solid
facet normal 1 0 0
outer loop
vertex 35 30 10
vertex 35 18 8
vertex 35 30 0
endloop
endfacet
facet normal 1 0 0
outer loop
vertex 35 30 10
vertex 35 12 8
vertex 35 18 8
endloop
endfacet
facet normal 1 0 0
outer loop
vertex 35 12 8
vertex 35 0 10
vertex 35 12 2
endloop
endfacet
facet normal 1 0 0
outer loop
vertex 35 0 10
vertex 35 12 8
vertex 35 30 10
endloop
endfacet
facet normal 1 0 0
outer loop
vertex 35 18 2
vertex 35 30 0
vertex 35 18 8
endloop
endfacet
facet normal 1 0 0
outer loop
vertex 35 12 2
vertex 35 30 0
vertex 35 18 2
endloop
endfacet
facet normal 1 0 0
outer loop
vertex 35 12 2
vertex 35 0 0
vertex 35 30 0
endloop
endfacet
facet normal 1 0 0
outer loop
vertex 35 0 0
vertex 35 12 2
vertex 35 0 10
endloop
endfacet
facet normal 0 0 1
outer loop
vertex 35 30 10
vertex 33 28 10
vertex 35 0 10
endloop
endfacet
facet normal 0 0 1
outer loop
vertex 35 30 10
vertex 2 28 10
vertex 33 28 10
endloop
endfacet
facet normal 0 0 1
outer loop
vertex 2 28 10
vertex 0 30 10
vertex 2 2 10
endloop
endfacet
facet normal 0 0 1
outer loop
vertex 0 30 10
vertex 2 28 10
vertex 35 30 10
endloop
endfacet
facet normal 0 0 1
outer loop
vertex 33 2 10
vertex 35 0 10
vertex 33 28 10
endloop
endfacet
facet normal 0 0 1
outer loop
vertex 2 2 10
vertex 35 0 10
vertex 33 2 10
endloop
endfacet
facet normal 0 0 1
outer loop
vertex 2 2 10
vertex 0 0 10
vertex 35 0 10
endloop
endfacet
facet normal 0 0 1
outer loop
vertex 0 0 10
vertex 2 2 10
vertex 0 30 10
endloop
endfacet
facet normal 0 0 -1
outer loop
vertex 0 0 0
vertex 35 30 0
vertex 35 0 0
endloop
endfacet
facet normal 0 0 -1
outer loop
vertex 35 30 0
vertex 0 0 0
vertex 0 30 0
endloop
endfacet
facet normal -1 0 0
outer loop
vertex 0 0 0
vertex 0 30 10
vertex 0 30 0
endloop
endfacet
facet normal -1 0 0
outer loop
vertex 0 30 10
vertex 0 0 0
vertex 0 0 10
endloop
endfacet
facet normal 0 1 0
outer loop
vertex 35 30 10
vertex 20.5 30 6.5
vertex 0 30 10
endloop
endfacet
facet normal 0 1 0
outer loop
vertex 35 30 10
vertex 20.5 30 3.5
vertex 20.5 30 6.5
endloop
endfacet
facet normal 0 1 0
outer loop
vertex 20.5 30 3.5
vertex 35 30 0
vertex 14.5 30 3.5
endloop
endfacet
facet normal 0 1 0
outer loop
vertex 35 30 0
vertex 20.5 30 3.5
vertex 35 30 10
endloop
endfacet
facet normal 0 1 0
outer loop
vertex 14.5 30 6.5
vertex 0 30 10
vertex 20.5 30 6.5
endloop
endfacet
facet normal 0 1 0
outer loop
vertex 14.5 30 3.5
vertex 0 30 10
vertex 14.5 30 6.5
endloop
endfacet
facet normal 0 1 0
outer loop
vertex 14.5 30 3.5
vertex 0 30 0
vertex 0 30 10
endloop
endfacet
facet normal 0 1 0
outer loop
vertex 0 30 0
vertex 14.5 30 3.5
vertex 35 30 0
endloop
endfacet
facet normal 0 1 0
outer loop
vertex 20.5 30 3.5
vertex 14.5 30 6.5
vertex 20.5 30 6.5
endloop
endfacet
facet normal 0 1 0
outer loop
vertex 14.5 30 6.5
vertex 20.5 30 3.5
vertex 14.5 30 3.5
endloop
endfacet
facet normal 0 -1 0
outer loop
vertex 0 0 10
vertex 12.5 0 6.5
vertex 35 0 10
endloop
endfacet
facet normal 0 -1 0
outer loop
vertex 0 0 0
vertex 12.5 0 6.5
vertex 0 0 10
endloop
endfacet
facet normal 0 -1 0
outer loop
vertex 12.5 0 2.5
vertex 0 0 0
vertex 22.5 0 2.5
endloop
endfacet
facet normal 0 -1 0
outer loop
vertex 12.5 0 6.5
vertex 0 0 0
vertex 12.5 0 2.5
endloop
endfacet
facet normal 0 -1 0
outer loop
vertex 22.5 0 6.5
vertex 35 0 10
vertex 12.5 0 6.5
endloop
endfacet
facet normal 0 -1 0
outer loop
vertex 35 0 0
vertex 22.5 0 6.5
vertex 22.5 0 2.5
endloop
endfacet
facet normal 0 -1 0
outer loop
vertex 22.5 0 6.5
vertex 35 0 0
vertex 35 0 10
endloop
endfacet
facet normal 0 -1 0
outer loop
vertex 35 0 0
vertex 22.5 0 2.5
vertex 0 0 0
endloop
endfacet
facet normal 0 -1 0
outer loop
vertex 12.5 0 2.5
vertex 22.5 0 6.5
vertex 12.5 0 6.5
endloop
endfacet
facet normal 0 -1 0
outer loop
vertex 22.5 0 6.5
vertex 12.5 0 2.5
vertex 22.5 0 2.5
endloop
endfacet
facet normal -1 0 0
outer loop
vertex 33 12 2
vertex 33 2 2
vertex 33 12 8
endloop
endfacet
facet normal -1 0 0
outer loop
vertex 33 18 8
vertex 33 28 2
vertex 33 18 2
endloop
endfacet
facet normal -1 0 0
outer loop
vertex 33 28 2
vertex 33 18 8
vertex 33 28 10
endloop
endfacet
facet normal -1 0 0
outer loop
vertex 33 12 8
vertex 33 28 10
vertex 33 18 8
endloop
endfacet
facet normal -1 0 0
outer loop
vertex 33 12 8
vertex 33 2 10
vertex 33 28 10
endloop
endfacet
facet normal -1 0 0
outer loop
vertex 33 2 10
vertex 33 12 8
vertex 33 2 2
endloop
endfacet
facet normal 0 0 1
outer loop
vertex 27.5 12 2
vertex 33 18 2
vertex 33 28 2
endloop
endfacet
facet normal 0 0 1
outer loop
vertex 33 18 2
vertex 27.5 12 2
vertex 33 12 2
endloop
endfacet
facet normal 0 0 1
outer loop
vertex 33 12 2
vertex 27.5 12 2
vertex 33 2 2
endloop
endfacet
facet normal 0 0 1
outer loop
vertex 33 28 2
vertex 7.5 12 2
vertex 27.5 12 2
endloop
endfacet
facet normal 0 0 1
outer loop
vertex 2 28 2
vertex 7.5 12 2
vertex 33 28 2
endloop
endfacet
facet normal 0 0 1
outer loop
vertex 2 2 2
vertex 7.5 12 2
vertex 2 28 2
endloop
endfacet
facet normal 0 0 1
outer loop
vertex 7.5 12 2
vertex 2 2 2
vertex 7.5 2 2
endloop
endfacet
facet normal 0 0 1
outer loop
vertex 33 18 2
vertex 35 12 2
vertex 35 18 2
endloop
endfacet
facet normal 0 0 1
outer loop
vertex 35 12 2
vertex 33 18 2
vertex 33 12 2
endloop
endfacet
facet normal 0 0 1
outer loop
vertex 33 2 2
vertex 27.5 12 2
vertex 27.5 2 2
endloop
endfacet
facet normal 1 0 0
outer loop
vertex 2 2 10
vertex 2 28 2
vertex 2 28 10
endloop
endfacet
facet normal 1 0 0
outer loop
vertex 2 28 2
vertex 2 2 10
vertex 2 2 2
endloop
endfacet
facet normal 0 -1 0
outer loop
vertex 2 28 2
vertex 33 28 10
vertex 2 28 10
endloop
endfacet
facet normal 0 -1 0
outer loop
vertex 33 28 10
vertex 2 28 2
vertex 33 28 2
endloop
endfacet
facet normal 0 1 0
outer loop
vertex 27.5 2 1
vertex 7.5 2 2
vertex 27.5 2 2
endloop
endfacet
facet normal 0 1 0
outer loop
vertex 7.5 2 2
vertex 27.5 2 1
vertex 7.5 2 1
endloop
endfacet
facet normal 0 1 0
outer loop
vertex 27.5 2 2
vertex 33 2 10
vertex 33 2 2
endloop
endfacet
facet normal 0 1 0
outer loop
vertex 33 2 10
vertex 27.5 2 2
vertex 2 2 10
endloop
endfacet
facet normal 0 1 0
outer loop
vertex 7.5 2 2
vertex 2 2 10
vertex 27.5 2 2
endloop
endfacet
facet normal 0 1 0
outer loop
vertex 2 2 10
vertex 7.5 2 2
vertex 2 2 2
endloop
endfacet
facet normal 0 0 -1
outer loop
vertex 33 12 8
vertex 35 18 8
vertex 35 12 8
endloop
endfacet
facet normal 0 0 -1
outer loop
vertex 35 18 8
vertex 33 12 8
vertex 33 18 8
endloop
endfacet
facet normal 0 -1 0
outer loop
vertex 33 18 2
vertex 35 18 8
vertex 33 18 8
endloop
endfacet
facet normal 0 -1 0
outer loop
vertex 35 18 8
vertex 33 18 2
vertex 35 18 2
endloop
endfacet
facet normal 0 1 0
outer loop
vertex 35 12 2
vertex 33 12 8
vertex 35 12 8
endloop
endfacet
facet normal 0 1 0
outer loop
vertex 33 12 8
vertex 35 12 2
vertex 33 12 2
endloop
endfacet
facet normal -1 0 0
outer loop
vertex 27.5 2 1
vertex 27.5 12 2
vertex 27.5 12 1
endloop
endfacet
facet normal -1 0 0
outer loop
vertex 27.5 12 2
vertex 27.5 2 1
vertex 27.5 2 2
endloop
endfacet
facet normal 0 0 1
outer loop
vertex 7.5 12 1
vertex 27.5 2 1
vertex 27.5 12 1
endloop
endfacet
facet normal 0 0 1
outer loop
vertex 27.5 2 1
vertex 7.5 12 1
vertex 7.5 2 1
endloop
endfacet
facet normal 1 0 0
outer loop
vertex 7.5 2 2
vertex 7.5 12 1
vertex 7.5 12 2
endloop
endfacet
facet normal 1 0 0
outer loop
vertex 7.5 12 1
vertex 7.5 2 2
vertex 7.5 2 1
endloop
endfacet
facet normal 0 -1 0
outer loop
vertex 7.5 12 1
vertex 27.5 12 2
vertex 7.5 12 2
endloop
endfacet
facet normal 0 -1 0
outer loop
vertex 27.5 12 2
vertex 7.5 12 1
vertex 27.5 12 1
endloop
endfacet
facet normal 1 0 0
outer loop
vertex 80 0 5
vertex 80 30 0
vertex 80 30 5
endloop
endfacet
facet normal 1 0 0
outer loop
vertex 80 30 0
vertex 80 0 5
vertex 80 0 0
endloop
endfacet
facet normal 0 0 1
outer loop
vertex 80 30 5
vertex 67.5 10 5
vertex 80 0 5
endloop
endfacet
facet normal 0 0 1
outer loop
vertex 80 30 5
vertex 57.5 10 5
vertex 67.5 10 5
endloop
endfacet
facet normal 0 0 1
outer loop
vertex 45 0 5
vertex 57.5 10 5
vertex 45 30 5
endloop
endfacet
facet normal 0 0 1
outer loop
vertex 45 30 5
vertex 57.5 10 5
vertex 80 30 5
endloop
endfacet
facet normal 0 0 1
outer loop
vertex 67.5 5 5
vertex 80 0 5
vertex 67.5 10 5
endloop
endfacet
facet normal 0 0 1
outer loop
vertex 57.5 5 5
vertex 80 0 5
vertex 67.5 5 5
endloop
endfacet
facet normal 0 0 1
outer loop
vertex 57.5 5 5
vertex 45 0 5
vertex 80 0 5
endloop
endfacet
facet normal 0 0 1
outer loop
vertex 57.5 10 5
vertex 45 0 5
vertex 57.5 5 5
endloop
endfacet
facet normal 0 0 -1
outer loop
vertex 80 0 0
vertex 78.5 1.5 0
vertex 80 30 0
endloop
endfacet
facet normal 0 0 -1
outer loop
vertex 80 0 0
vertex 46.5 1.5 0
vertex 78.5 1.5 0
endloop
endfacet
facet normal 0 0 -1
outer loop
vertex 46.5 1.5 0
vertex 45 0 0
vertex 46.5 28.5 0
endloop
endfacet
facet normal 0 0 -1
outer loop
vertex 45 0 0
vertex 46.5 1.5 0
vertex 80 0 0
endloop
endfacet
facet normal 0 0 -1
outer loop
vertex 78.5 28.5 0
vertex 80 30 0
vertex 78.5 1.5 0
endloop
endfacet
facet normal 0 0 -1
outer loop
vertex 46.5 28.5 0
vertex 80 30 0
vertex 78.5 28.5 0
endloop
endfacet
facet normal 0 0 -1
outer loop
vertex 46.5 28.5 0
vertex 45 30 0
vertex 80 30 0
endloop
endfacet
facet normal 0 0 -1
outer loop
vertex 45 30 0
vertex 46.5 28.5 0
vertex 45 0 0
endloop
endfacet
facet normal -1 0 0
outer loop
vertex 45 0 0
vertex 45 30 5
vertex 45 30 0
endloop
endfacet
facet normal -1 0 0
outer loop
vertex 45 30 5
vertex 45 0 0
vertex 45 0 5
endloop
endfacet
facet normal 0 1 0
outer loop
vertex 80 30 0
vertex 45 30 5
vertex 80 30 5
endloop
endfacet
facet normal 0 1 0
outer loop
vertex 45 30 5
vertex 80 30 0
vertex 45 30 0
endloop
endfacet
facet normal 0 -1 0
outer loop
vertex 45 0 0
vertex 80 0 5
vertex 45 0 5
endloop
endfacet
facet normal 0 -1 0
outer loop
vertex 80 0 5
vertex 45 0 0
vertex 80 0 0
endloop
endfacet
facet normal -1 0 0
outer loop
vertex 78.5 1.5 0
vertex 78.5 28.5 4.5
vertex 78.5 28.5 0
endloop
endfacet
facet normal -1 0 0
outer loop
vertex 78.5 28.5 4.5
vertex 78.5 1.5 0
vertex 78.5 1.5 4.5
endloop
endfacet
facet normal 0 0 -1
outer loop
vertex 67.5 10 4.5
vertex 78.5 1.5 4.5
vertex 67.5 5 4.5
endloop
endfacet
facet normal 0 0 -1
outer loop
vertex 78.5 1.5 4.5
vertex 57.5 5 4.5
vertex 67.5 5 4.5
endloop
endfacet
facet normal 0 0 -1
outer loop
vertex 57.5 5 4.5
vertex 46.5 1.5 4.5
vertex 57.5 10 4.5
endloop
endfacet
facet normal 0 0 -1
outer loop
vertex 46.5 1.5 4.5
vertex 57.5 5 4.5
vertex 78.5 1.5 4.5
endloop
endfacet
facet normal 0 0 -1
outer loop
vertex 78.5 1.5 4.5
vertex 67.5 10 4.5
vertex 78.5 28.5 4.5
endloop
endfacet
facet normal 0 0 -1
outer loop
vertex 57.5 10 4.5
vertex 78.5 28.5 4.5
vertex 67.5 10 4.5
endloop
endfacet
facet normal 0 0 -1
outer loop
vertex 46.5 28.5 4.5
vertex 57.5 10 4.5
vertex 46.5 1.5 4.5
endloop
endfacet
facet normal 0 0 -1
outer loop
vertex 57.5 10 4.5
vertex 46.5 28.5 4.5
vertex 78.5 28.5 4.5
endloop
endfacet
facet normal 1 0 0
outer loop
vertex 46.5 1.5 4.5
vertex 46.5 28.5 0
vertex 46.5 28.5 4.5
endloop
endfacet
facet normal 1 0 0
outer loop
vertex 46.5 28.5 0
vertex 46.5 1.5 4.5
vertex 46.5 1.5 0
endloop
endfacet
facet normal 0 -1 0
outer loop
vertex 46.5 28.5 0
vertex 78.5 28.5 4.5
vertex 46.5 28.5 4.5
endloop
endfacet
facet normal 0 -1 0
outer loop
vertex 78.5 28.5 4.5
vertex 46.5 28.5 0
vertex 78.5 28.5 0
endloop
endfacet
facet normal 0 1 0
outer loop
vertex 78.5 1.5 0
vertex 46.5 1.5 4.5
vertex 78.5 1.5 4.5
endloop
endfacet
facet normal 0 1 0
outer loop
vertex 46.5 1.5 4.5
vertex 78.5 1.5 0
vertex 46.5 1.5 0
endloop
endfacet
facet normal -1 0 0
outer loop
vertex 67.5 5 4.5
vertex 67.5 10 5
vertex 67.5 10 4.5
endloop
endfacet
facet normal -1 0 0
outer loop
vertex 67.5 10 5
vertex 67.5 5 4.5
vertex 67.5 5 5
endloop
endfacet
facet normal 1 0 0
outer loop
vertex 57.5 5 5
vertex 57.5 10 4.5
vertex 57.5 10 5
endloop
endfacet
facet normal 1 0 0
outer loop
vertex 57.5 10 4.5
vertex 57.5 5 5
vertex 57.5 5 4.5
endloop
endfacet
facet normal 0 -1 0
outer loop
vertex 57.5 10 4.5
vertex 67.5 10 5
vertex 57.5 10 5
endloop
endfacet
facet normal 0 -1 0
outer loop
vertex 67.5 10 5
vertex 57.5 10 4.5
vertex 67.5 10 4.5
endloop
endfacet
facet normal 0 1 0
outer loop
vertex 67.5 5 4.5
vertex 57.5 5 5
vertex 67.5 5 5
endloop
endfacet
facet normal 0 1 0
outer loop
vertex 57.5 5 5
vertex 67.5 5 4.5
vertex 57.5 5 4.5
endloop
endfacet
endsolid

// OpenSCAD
// Two-Part Enclosure for Mini Theremin (Final Version)
// All dimensions are in millimeters

// Parameters:
enclosure_length = 35;
enclosure_width  = 30;
bottom_height    = 10;
lid_thickness    = 5;
wall_thickness   = 2;
clearance        = 0.5;

// Battery cavity (indentation only; do not cut through the bottom)
battery_cavity_length = 20;
battery_cavity_width  = 10;
battery_cavity_depth  = 5;

// USB slot parameters (back wall)
usb_cutout_width  = 10;
usb_cutout_height = 4;

// Buzzer slot parameters (front wall)
buzzer_cutout_width  = 6;
buzzer_cutout_height = 3;

// Power switch slot parameters (right wall)
switch_slot_height = 6;  // vertical extent (a square of wall thickness by 6 mm by 6 mm)

// Sensor slot parameters (in the lid)
sensor_slot_length = 10;
sensor_slot_width  = 5;

////////////////////////////
// Module: Bottom Enclosure
////////////////////////////
module bottom_enclosure() {
  difference() {
    // Outer solid box for the bottom enclosure:
    cube([enclosure_length, enclosure_width, bottom_height], false);
    
    // Hollow out the interior starting at z = wall_thickness to keep a solid bottom:
    translate([wall_thickness, wall_thickness, wall_thickness])
      cube([enclosure_length - 2*wall_thickness, enclosure_width - 2*wall_thickness, bottom_height - wall_thickness], false);
    
    // USB slot on the back wall (assumed at y = 0):
    // Cut a through–hole only through the wall thickness.
    translate([ (enclosure_length - usb_cutout_width) / 2, 0 - wall_thickness, bottom_height/4 ])
      cube([usb_cutout_width, wall_thickness, usb_cutout_height], false);
    
    // Buzzer slot on the front wall (assumed at y = enclosure_width):
    translate([ (enclosure_length - buzzer_cutout_width) / 2, enclosure_width, (bottom_height - buzzer_cutout_height) / 2 ])
      cube([buzzer_cutout_width, wall_thickness, buzzer_cutout_height], false);
    
    // Power switch slot on the right wall (assumed at x = enclosure_length):
    // Cut a through–hole through the wall thickness.
    translate([enclosure_length - wall_thickness, (enclosure_width - switch_slot_height) / 2, bottom_height/2 - switch_slot_height/2 ])
      cube([wall_thickness, switch_slot_height, switch_slot_height], false);
    
    // Battery cavity: an internal indentation (do NOT cut through the bottom)
    // Positioned so that 1 mm remains at the very bottom.
    translate([ (enclosure_length - battery_cavity_length) / 2, wall_thickness, 1 ])
      cube([battery_cavity_length, battery_cavity_width, battery_cavity_depth], false);
  }
}

//////////////////////
// Module: Top Lid
//////////////////////
module top_lid() {
  difference() {
    // Outer lid: a solid plate.
    cube([enclosure_length, enclosure_width, lid_thickness], false);
    
    // Inner recess for a snug fit over the bottom enclosure.
    // Cut out from the underside so that 0.5 mm remains as the top.
    translate([wall_thickness - clearance, wall_thickness - clearance, 0])
      cube([enclosure_length - 2*(wall_thickness - clearance), enclosure_width - 2*(wall_thickness - clearance), lid_thickness - 0.5], false);
    
    // Sensor slot: a through–cut in the lid that spans the full lid thickness.
    translate([ (enclosure_length - sensor_slot_length) / 2, (enclosure_width/4) - sensor_slot_width/2, 0 ])
      cube([sensor_slot_length, sensor_slot_width, lid_thickness], false);
  }
}

//////////////////////////////
// Render Both Parts Side by Side
//////////////////////////////
union() {
  // Bottom enclosure (in blue)
  translate([0, 0, 0])
    color("blue") bottom_enclosure();
  
  // Top lid (in green), shifted to the right
  translate([enclosure_length + 10, 0, 0])
    color("green") top_lid();
}
